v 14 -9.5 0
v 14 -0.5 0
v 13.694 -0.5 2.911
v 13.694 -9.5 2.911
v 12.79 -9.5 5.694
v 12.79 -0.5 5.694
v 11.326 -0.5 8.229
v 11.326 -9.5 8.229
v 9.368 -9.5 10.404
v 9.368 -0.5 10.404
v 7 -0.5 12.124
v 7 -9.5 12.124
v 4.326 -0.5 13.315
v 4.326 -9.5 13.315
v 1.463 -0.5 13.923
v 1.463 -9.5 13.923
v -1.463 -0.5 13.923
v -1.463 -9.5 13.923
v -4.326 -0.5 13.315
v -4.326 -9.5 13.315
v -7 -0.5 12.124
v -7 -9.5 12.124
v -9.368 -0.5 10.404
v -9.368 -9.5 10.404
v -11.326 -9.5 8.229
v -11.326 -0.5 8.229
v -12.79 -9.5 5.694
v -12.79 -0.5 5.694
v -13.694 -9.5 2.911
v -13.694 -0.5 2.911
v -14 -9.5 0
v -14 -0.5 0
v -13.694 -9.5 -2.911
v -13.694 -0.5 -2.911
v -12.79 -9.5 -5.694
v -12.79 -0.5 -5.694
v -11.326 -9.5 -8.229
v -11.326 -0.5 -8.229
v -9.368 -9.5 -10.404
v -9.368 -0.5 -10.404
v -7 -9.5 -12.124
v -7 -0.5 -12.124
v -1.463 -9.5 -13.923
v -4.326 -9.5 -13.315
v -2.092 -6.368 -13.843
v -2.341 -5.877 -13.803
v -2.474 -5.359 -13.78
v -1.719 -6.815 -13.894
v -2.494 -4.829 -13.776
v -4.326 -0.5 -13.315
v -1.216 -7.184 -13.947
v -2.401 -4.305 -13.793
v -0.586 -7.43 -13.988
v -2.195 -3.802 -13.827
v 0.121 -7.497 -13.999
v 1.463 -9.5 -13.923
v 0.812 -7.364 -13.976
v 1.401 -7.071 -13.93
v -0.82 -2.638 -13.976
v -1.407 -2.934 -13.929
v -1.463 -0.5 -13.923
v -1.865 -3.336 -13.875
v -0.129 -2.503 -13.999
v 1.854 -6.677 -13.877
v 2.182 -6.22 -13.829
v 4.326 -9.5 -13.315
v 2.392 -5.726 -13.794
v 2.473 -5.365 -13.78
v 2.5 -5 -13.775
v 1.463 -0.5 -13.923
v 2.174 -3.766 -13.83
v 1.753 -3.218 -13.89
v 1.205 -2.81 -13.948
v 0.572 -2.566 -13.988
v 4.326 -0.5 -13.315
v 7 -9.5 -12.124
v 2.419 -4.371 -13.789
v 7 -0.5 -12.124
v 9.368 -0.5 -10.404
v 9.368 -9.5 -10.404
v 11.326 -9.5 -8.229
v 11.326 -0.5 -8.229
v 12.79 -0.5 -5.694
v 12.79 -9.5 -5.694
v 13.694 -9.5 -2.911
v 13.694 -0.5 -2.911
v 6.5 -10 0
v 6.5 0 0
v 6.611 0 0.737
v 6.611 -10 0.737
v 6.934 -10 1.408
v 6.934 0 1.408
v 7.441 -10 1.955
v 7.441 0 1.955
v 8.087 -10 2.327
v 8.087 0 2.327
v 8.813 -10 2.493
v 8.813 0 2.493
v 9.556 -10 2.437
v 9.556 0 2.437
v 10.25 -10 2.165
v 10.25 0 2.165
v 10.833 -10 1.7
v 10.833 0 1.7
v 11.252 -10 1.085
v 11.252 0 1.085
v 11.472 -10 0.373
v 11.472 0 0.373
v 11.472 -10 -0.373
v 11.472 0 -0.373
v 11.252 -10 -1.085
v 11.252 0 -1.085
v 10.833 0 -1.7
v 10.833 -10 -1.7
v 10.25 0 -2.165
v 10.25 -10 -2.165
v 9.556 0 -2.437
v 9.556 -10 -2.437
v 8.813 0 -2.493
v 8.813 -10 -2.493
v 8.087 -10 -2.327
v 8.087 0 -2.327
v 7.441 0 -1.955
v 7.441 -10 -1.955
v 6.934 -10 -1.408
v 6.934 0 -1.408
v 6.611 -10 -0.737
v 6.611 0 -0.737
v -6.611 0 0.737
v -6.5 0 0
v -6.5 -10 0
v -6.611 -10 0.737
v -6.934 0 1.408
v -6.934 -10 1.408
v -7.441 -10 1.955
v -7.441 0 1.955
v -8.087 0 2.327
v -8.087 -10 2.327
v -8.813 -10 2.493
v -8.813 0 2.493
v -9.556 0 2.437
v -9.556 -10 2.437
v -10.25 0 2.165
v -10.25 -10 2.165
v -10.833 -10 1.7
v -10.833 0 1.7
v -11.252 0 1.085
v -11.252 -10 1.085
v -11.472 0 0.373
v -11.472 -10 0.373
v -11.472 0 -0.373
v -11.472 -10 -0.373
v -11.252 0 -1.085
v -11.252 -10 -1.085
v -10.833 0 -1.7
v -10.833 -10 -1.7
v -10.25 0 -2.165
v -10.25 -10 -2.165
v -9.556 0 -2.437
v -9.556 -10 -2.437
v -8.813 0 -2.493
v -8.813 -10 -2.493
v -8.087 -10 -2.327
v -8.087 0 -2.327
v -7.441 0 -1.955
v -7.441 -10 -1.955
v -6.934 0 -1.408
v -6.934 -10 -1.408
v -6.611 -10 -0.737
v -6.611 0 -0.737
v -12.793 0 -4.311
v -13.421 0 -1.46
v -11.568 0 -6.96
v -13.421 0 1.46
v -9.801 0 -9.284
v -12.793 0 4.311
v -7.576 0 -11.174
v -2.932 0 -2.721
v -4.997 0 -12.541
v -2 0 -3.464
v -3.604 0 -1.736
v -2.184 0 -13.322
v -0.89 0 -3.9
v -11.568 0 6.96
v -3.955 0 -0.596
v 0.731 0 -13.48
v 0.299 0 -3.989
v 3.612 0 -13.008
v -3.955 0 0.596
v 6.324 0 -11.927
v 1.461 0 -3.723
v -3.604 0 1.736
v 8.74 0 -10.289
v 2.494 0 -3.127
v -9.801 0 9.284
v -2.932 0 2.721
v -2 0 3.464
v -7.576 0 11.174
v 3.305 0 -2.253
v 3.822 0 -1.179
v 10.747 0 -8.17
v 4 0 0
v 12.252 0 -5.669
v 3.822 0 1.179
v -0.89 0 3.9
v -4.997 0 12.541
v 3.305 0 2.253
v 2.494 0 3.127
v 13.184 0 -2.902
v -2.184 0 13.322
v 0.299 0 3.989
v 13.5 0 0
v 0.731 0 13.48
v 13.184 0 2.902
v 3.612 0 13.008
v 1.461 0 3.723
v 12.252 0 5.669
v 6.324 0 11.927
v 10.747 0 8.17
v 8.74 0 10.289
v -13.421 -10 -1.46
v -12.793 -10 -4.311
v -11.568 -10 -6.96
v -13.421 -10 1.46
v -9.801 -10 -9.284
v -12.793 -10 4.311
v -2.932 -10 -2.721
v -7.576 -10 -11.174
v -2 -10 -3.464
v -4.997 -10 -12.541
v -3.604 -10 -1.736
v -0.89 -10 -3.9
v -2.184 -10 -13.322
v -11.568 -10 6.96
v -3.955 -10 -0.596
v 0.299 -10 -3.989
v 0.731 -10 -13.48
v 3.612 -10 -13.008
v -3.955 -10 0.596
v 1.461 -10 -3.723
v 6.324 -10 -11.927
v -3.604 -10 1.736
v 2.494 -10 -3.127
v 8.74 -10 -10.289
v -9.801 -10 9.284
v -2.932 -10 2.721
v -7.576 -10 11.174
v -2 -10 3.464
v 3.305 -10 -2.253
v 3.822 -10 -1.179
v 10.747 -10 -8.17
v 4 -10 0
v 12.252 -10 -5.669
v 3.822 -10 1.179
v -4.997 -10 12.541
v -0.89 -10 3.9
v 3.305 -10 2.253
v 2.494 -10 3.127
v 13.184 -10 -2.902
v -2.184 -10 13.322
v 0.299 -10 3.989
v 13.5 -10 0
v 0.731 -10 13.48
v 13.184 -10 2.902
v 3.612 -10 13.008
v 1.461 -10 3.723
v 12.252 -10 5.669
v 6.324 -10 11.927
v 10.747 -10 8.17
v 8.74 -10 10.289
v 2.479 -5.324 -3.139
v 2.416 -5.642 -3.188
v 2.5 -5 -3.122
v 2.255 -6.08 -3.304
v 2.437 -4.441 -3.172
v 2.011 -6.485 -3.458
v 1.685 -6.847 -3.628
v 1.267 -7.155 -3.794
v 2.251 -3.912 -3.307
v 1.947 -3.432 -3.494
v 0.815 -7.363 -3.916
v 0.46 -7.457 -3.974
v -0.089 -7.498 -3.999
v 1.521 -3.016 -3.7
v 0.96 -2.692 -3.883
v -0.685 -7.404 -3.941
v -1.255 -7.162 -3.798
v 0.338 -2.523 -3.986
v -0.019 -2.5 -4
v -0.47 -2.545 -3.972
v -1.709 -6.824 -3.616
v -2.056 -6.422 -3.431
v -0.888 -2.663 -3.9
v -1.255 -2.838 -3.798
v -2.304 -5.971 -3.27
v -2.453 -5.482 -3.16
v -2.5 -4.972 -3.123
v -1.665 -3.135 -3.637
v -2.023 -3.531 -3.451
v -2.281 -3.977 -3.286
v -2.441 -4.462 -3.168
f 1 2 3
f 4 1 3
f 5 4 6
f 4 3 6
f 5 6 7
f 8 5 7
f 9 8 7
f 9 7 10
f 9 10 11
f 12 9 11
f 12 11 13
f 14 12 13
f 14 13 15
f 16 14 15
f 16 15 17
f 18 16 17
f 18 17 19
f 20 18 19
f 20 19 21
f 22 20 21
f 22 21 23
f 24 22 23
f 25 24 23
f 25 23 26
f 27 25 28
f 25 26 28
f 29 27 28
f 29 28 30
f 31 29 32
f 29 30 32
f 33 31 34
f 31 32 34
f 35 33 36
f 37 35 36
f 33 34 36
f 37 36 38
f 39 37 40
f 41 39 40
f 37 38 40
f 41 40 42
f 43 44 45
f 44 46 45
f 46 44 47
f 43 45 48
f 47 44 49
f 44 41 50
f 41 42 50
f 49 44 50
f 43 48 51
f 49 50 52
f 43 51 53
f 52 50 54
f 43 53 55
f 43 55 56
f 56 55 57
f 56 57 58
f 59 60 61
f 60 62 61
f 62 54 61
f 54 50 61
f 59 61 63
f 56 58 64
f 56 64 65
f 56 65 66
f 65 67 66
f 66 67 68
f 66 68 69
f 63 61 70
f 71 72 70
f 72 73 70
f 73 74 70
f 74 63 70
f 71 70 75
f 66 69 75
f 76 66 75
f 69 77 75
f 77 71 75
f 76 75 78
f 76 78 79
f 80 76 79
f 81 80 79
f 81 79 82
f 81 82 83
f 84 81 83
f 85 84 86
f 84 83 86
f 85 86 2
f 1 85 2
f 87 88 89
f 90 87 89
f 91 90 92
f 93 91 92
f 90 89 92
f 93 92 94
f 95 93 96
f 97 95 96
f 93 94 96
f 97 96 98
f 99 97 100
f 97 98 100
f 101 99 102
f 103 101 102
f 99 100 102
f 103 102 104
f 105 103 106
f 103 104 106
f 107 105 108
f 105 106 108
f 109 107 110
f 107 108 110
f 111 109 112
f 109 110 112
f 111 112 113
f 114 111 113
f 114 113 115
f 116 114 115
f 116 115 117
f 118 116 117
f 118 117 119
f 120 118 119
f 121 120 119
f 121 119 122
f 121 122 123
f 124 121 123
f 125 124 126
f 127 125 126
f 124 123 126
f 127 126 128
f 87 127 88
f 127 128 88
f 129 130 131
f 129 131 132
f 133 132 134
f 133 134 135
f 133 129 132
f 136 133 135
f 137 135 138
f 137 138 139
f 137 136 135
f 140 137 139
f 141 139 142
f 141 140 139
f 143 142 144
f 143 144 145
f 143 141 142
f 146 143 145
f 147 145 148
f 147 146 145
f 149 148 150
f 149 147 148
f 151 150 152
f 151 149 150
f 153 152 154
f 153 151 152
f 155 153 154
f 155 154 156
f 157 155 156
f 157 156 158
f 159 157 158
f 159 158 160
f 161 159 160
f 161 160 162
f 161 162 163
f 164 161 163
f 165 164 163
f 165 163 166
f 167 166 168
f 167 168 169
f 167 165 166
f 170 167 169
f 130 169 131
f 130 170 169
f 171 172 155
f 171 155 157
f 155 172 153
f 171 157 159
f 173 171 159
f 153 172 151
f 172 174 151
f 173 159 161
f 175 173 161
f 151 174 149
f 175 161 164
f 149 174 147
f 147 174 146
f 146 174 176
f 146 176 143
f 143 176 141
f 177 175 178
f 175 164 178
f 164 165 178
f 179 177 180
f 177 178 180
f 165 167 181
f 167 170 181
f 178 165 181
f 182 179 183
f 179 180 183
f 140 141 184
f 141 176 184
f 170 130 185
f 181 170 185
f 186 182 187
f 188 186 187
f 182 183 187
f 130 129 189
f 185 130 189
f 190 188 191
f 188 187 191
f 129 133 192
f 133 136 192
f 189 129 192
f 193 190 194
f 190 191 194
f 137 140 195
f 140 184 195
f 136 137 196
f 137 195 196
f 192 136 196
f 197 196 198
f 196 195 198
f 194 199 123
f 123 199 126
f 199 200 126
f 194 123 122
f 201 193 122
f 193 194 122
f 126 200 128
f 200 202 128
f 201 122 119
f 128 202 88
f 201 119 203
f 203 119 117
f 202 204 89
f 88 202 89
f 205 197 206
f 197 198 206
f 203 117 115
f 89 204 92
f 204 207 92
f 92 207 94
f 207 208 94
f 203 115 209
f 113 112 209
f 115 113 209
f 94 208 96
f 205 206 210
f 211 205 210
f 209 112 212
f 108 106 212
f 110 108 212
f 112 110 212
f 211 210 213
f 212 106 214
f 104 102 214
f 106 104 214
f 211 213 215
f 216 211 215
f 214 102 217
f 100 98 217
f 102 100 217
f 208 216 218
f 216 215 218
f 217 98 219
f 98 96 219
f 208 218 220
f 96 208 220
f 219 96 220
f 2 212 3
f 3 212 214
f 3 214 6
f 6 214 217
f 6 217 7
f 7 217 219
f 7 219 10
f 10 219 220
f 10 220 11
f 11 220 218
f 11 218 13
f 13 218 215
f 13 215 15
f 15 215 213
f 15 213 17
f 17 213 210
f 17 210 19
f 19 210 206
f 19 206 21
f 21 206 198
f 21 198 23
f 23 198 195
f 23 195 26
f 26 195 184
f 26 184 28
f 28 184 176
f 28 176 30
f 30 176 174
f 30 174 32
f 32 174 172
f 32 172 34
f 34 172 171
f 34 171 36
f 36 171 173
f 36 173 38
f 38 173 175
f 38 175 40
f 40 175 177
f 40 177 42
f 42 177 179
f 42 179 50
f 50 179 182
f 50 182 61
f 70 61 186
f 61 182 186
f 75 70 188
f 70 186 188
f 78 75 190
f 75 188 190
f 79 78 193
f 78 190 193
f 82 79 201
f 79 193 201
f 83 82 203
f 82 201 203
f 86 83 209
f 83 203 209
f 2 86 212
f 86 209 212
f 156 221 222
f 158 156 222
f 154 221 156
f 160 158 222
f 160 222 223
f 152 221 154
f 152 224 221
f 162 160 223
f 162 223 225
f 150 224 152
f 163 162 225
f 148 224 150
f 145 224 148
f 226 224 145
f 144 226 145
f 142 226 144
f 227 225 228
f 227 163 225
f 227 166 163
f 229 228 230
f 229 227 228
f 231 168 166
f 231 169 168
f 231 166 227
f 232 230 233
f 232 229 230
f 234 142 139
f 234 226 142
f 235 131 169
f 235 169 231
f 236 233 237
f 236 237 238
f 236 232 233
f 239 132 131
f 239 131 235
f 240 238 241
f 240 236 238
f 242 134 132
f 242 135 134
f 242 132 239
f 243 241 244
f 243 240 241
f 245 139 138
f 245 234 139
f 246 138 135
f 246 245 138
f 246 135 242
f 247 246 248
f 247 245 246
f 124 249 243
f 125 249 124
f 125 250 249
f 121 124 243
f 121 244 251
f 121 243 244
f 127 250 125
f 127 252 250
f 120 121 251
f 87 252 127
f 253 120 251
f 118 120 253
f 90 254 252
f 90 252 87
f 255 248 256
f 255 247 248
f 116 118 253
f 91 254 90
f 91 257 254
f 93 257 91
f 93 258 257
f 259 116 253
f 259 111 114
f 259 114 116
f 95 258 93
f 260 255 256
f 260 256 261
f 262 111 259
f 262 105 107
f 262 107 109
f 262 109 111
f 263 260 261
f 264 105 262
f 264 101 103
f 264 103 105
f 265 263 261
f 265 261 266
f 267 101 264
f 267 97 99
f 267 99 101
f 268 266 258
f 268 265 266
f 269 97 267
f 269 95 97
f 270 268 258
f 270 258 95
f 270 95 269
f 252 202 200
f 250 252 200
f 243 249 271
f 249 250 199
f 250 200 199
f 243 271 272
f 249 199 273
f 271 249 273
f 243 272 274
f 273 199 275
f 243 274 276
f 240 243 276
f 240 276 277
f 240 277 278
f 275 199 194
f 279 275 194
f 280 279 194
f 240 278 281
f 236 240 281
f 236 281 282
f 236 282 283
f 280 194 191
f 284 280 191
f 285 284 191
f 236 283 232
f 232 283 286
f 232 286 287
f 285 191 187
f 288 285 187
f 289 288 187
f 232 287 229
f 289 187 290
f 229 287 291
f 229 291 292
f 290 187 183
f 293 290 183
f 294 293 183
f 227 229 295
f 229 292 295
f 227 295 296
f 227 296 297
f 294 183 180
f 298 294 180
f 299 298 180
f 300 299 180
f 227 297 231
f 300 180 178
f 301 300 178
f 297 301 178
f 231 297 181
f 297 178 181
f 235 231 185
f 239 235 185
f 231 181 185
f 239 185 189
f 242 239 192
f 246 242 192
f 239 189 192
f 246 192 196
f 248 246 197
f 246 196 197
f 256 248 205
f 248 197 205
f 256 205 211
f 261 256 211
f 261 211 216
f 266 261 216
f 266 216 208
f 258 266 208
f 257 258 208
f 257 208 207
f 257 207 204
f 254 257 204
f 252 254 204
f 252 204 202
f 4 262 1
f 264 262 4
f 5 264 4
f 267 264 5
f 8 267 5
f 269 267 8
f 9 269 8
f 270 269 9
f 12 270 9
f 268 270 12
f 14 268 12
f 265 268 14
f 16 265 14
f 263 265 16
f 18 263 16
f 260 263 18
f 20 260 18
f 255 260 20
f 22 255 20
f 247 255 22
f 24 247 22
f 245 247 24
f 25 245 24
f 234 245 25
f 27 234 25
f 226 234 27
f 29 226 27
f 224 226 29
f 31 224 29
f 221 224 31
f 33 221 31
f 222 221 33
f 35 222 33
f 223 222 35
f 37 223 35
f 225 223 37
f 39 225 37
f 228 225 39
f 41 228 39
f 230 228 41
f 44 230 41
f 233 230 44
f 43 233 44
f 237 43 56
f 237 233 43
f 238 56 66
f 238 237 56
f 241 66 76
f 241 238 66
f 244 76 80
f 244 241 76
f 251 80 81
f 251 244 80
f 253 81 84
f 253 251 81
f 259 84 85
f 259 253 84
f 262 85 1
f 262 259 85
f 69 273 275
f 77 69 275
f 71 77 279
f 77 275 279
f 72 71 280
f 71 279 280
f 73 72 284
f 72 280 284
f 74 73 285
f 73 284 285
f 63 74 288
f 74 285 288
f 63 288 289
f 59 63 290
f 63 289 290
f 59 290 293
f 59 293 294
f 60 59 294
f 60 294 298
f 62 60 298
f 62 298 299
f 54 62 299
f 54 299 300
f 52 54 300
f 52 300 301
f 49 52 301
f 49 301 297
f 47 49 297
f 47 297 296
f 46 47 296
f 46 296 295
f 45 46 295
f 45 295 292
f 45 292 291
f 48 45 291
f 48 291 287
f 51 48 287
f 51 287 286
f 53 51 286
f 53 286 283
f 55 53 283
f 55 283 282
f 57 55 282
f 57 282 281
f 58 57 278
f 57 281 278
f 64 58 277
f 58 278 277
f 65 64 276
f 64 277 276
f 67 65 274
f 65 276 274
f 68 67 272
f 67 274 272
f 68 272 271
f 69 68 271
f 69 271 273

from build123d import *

# Parameters (mm, degrees)
F0_R     = 2.5
F0_R_2   = 14
F1_DEPTH = 10
F2_SIZE  = 0.5
F3_R     = 2.5
F4_DEPTH = 25


with BuildPart() as f1:
    # F0 (on Front) → F1 (new body)
    with BuildSketch(Plane.XZ):
        with Locations((-9, 0)):
            Circle(F0_R)
        with BuildLine():
            ThreePointArc((11.5, 0), (9, 2.5), (6.5, 0))
            ThreePointArc((6.5, 0), (9, -2.5), (11.5, 0))
        make_face()
        Circle(F0_R_2)
        with Locations((-9, 0)):
            Circle(F0_R, mode=Mode.SUBTRACT)
        with BuildLine():
            ThreePointArc((-4, 0), (0, 4), (4, 0))
            ThreePointArc((4, 0), (0, -4), (-4, 0))
        make_face(mode=Mode.SUBTRACT)
        with BuildLine():
            ThreePointArc((11.5, 0), (9, -2.5), (6.5, 0))
            ThreePointArc((6.5, 0), (9, 2.5), (11.5, 0))
        make_face(mode=Mode.SUBTRACT)
    extrude(amount=F1_DEPTH)

    # F2
    f2_edges = [f1.edges().sort_by_distance(p)[0] for p in [
        (-14, -10, 0),
        (-14, 0, 0),
    ]]
    chamfer(f2_edges, length=F2_SIZE)

    # F3 (on Top) → F4 (cut)
    with BuildSketch(Plane.XY):
        with Locations((0, -5)):
            Circle(F3_R)
    extrude(amount=-F4_DEPTH, mode=Mode.SUBTRACT)


solid = f1.part
